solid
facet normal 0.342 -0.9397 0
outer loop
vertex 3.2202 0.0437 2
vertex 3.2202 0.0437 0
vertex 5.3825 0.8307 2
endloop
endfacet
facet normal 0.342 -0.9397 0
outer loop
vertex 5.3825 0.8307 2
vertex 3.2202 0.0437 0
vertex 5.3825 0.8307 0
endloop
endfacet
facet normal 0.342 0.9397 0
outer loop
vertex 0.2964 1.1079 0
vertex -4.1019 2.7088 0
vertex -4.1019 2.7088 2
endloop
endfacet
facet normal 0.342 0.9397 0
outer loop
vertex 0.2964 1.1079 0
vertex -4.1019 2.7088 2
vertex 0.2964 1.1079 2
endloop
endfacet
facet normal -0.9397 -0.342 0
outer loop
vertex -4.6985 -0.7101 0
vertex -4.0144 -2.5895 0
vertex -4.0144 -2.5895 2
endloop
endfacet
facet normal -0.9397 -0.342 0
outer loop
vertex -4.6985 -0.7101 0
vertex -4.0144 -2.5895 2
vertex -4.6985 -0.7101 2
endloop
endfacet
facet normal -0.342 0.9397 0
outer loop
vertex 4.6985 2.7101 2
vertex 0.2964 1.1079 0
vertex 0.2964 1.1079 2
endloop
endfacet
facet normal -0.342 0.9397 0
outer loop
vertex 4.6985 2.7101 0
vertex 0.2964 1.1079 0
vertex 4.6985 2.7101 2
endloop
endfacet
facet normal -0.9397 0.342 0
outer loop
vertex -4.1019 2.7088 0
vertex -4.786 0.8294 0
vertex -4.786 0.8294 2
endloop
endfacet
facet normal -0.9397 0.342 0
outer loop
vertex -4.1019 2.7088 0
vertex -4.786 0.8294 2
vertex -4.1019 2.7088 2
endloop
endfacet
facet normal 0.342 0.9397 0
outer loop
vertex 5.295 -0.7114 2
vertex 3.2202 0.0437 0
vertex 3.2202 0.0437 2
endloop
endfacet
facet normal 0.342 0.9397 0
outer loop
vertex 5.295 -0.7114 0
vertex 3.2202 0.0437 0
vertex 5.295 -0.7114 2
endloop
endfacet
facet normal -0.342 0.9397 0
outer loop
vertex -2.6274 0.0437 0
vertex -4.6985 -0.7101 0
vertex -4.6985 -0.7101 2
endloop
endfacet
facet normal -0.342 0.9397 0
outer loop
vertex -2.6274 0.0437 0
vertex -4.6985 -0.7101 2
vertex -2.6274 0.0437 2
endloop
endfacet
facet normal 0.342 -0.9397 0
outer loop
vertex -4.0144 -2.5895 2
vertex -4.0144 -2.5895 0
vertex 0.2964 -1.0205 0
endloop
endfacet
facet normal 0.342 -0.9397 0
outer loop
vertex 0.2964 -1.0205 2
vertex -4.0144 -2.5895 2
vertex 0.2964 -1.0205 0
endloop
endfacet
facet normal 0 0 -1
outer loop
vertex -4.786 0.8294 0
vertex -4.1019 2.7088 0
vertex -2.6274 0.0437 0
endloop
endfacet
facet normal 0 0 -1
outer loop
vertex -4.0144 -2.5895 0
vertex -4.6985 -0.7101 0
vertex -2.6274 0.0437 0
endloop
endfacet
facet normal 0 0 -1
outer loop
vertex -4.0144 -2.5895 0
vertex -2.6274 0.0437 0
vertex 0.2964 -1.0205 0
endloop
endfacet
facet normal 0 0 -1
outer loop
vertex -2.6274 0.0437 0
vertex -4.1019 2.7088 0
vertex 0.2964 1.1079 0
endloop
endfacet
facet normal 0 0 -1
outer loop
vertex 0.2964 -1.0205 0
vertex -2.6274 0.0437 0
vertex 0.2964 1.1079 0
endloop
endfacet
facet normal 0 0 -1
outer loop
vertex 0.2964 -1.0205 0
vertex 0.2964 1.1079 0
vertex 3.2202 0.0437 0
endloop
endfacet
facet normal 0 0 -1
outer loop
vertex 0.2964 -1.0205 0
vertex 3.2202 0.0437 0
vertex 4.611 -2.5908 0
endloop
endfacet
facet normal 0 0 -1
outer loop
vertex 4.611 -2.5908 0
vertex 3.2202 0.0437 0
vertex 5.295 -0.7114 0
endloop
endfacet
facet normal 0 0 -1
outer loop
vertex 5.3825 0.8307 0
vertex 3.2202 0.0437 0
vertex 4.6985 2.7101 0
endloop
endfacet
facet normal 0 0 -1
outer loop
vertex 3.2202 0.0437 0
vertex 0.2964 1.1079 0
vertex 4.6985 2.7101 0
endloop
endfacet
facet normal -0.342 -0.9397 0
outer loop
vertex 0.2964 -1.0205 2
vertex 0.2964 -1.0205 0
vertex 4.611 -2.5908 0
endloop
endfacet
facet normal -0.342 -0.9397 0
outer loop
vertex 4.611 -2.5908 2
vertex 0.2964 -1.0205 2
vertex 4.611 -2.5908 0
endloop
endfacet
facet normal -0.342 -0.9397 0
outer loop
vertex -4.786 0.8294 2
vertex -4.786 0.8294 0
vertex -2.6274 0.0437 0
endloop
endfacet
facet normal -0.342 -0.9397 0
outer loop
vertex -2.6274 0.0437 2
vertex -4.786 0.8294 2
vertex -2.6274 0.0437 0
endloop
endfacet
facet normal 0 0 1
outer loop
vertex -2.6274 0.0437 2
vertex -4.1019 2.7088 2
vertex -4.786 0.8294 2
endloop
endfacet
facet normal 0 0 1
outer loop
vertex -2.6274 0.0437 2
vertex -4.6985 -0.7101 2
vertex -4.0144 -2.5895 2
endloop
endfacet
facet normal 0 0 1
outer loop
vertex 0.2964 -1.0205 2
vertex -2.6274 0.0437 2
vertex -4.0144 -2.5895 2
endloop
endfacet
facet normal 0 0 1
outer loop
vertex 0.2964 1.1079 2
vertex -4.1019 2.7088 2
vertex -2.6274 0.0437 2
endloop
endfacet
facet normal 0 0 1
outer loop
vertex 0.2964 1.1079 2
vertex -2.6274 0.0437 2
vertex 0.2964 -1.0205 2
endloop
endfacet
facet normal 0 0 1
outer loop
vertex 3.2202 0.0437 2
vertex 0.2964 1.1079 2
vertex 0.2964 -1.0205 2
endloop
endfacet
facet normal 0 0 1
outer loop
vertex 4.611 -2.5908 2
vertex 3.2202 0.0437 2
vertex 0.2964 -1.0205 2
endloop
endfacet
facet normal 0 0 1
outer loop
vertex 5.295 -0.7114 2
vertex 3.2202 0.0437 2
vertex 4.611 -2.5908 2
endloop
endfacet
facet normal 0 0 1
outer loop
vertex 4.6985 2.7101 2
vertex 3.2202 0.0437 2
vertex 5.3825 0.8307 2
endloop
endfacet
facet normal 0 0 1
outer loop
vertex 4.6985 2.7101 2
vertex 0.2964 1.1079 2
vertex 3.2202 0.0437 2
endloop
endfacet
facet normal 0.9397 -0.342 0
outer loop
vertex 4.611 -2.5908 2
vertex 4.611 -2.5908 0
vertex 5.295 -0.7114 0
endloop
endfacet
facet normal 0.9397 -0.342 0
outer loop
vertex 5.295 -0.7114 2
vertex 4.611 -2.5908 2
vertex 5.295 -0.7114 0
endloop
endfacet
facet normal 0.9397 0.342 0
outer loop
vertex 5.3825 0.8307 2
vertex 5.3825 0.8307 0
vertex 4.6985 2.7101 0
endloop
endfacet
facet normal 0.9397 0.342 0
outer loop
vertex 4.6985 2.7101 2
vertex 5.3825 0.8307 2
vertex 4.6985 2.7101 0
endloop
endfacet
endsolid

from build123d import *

# Parameters (mm, degrees)
BOX001_W               = 10
BOX001_H               = 2
BOX001_DEPTH           = 2
BOX001_PLACEMENT_ANGLE = 20
BOX_W                  = 10
BOX_H                  = 2
BOX_DEPTH              = 2
BOX_PLACEMENT_ANGLE    = 20


with BuildPart() as cub001:
    # Box001 → Box001 (new body)
    with BuildSketch(Plane.XY):
        with Locations((5, 1)):
            Rectangle(BOX001_W, BOX001_H)
    extrude(amount=BOX001_DEPTH)


with BuildPart() as cub001_1:
    # Box001 placement: moved
    add(cub001.part.moved(Location((0.21404, 1.829385, 0))).rotate(Axis((0.21404, 1.829385, 0), (0, 0, -1)), BOX001_PLACEMENT_ANGLE))


with BuildPart() as fusion:
    # Box → Box (new body)
    with BuildSketch(Plane.XY):
        with Locations((5, 1)):
            Rectangle(BOX_W, BOX_H)
    extrude(amount=BOX_DEPTH)


with BuildPart() as fusion_1:
    # Box placement: moved
    add(fusion.part.moved(Location((0.985577, -1.589486, 0))).rotate(Axis((0.985577, -1.589486, 0), (0, 0, 1)), BOX_PLACEMENT_ANGLE))

    # Fusion: union Cub001
    add(cub001_1.part)


with BuildPart() as fusion_2:
    # Fusion placement: moved
    add(fusion_1.part.moved(Location((-5, -1, 0))))


solid = fusion_2.part
